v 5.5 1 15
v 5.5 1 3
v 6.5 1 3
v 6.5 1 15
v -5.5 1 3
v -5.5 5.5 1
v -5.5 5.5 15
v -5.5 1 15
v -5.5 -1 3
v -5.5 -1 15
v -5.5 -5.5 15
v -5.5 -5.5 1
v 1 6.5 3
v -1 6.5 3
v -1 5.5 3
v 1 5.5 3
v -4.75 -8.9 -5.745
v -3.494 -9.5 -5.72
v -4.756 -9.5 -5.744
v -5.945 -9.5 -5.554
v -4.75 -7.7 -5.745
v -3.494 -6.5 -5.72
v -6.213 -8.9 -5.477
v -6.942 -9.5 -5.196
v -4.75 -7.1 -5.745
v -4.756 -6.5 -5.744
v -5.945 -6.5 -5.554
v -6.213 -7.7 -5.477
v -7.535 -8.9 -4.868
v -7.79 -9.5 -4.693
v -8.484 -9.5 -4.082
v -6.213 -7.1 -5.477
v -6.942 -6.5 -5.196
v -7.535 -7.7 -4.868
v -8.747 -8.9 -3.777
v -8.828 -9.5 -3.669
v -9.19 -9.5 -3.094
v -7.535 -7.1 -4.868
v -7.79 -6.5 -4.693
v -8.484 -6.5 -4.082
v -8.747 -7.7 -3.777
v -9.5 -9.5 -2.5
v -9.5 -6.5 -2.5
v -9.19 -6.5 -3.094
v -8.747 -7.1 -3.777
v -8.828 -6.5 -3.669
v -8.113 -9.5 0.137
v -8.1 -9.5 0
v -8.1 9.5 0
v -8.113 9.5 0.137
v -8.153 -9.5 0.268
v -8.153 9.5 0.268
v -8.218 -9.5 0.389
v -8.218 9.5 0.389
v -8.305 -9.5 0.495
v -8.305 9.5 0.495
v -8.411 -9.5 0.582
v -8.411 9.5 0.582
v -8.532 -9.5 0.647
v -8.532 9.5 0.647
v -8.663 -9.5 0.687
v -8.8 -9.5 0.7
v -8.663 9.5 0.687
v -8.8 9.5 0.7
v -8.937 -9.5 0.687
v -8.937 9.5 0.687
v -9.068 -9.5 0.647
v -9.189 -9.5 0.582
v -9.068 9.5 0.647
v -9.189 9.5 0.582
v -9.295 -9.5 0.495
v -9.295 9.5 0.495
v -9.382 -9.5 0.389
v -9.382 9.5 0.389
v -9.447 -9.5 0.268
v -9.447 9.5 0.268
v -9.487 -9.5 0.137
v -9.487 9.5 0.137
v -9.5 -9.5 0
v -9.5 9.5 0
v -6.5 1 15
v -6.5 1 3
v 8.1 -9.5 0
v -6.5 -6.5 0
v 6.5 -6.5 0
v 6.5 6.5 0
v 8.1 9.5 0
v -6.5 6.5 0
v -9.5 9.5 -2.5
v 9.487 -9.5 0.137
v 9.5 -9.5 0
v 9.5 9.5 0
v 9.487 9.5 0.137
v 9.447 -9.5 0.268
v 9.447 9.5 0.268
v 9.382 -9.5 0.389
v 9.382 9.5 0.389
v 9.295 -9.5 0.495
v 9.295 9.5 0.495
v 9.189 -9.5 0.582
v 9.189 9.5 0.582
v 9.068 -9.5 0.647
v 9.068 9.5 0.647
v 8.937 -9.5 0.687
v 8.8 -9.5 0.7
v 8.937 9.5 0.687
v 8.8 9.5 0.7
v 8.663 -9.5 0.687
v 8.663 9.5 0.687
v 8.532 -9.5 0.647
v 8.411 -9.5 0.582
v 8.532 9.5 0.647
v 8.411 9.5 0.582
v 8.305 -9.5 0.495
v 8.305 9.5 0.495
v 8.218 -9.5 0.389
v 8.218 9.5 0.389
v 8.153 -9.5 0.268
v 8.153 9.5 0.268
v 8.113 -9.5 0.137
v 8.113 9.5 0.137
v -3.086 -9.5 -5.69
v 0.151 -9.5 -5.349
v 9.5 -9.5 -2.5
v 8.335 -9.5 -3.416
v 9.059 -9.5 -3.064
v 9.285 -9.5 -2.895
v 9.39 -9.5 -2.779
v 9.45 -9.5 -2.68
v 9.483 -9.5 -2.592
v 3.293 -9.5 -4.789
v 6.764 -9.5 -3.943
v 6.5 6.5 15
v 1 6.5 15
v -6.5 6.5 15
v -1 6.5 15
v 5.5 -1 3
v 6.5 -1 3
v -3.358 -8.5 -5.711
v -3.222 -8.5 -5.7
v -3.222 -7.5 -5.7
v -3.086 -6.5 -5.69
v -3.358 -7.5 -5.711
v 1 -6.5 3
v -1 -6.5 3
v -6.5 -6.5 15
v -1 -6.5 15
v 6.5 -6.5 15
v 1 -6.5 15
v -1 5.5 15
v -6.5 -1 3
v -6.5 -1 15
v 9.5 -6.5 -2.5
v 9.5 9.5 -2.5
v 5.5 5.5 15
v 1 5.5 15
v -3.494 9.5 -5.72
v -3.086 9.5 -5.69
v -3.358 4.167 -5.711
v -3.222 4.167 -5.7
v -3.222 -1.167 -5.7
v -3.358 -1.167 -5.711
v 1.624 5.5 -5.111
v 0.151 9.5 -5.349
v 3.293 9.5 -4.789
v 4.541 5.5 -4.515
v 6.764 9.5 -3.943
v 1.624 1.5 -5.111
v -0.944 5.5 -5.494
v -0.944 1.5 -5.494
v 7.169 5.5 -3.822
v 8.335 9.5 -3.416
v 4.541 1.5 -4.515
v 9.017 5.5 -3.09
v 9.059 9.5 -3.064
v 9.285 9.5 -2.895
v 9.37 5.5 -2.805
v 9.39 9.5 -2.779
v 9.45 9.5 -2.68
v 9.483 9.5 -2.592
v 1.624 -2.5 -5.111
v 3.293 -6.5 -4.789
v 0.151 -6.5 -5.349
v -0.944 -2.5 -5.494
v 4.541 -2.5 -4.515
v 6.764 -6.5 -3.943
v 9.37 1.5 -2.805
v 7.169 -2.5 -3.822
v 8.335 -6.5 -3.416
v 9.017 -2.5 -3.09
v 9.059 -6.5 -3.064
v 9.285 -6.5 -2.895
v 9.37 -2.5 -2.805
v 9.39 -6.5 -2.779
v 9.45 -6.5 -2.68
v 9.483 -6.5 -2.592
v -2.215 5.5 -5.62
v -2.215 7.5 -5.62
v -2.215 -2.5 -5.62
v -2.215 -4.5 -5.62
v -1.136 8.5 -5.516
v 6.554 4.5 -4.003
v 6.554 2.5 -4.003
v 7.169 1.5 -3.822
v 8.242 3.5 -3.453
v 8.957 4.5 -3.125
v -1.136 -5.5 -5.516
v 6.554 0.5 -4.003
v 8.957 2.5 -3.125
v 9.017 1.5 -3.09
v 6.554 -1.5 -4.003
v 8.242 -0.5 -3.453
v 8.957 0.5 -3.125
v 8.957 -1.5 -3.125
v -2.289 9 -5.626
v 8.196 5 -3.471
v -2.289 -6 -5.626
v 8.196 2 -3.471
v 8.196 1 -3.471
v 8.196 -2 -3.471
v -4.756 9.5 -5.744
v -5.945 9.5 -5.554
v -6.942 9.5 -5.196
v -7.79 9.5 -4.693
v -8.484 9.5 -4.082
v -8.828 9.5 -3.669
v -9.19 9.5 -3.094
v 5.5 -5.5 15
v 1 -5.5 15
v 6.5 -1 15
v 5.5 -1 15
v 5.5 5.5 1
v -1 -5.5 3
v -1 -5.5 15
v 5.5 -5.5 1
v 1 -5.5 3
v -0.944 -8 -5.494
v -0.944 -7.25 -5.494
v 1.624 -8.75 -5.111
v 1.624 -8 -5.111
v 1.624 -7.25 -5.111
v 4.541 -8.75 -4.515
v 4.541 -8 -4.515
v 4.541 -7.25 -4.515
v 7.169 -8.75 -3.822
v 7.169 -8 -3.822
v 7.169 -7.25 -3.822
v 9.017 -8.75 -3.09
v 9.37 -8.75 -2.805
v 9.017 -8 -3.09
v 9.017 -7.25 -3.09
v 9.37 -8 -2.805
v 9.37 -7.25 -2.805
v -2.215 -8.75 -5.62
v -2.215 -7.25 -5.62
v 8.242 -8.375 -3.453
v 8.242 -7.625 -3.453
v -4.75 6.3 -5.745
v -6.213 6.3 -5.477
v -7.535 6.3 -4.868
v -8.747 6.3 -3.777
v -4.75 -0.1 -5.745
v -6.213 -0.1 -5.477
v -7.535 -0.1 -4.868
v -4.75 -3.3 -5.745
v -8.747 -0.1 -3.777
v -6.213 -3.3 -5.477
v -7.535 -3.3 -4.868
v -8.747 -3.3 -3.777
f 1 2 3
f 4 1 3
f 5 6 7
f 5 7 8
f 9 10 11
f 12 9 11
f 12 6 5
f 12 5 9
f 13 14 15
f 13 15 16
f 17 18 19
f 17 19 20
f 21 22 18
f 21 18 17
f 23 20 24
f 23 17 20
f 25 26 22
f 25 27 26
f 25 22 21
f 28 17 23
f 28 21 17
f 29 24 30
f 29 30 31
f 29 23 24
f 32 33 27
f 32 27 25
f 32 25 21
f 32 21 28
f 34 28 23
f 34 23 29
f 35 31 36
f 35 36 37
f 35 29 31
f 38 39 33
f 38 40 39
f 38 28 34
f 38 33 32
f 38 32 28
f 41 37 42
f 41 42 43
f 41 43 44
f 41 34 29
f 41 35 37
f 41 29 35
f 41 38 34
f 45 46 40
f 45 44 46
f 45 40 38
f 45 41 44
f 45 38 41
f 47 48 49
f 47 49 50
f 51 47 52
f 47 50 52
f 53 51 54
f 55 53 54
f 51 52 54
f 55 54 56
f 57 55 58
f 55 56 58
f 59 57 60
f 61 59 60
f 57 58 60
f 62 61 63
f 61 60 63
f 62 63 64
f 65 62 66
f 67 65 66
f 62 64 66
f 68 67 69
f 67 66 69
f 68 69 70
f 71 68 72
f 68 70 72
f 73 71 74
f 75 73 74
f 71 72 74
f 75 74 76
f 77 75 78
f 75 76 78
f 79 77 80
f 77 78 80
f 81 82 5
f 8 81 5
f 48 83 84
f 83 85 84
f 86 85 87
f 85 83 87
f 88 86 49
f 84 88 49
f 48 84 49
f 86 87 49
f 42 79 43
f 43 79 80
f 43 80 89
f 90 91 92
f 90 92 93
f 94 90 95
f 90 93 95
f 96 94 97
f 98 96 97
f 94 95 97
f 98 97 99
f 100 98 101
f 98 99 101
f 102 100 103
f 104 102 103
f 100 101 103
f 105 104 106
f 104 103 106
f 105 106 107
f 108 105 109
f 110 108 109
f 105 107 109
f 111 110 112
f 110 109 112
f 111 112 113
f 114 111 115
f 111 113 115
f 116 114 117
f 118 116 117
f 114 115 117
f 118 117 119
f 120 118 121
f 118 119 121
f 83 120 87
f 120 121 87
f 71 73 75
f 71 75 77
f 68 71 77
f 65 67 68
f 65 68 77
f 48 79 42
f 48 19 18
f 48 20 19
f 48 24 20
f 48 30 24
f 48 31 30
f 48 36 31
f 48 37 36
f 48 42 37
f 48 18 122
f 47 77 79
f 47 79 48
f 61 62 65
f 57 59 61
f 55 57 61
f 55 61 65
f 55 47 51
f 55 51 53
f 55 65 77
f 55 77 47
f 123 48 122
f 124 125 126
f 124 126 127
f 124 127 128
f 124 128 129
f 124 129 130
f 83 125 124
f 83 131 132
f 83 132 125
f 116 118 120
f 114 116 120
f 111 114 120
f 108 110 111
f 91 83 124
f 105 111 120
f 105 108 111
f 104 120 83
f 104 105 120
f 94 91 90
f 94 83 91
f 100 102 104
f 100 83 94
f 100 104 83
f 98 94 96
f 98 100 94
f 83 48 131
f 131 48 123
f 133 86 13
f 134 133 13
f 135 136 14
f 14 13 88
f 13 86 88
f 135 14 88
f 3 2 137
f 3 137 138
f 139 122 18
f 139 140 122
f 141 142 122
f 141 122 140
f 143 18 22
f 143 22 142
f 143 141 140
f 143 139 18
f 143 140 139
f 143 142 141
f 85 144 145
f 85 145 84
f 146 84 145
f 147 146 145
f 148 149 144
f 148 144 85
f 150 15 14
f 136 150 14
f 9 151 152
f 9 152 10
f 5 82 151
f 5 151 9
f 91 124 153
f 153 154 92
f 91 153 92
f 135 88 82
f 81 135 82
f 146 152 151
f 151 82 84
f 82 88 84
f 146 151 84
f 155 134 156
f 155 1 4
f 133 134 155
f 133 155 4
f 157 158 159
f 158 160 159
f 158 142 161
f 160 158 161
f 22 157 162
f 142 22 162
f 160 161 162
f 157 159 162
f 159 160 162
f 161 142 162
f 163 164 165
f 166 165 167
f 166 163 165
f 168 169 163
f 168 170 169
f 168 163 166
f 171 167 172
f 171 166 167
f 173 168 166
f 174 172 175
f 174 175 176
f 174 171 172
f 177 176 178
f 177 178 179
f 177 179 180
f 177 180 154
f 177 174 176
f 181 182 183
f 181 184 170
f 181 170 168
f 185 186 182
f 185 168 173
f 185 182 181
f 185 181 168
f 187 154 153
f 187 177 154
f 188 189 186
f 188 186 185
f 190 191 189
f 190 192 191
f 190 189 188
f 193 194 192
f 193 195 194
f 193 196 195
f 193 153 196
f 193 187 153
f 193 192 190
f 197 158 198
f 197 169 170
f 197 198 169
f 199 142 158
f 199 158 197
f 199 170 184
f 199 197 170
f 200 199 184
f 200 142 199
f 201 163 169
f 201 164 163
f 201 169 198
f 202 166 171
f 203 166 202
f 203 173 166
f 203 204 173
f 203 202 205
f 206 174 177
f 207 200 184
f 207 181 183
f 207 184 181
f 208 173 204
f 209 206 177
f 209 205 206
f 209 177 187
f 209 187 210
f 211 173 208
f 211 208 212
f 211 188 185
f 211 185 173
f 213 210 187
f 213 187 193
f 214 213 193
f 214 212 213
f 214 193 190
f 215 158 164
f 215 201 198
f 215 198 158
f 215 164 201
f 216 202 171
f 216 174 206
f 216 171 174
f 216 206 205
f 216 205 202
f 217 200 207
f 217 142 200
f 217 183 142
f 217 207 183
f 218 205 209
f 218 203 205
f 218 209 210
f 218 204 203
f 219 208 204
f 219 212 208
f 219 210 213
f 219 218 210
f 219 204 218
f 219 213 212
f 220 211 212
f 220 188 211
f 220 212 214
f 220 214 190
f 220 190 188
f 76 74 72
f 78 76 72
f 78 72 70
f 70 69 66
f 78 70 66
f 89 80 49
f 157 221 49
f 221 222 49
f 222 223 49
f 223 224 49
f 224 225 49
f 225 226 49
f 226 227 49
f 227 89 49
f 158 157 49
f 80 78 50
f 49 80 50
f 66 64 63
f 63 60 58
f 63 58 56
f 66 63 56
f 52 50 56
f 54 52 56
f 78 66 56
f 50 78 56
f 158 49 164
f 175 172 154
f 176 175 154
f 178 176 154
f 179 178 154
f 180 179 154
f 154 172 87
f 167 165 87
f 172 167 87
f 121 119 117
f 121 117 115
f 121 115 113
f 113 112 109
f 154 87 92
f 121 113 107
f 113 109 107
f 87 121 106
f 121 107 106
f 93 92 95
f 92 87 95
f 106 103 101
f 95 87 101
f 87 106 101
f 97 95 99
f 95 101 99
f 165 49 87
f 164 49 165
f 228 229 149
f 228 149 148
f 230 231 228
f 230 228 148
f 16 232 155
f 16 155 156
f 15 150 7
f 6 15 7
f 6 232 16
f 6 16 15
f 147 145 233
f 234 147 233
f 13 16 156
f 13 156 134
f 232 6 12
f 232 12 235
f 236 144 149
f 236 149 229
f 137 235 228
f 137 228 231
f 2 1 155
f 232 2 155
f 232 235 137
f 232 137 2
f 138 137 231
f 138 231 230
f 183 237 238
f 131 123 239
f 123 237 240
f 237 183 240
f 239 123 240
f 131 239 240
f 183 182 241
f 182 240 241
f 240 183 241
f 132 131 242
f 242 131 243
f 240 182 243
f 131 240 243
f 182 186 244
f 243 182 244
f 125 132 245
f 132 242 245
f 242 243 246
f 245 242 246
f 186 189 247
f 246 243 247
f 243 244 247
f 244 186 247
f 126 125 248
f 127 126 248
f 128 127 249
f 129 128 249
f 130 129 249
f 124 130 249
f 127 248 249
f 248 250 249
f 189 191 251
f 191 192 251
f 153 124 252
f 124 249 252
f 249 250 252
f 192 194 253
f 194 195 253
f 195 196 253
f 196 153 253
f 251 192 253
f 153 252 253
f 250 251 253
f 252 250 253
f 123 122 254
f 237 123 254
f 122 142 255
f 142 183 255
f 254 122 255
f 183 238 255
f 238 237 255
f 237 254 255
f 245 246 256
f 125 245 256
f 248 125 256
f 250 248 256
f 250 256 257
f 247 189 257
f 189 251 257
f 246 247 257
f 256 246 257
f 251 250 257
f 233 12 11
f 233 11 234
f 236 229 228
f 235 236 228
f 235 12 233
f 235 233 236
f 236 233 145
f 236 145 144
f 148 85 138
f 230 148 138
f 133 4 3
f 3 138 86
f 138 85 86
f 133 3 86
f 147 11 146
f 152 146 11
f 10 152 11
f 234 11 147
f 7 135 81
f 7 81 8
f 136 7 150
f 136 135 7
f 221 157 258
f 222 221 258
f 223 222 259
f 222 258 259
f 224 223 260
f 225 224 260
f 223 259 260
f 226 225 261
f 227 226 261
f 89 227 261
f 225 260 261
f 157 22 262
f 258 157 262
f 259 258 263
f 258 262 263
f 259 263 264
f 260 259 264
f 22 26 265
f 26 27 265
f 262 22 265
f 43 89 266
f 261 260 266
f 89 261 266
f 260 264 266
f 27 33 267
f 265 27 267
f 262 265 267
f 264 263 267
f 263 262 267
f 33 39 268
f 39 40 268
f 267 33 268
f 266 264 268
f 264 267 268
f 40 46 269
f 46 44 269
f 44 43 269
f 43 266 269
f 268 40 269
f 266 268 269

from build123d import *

# Parameters (mm, degrees)
F0_W          = 5.5
F0_H          = 5.5
F0_W_2        = 2
F0_H_2        = 2
F1_DEPTH      = 15
F2_T          = -1
F3_START      = 3
F3_DEPTH      = 22
F5_DEPTH      = 16
F5_DEPTH_BACK = 3


with BuildPart() as f1:
    # F0 (on Top) → F1 (new body)
    with BuildSketch(Plane.XY):
        with Locations((3.75, 3.75)):
            Rectangle(F0_W, F0_H)
        with Locations((0, 3.75)):
            Rectangle(F0_W_2, F0_H)
        with Locations((-3.75, 3.75)):
            Rectangle(F0_W, F0_H)
        with Locations((-3.75, 0)):
            Rectangle(F0_W, F0_H_2)
        Rectangle(F0_W_2, F0_H_2)
        with Locations((3.75, 0)):
            Rectangle(F0_W, F0_H_2)
        with Locations((3.75, -3.75)):
            Rectangle(F0_W, F0_H)
        with Locations((0, -3.75)):
            Rectangle(F0_W_2, F0_H)
        with Locations((-3.75, -3.75)):
            Rectangle(F0_W, F0_H)
    extrude(amount=F1_DEPTH)

    # F2
    f2_openings = [f1.faces().sort_by_distance(p)[0] for p in [
        (0, 0, 15),
    ]]
    offset(amount=F2_T, openings=f2_openings)

    # F0 (on Top) → F3 (cut)
    with BuildSketch(Plane.XY.offset(F3_START)):
        with Locations((-3.75, 0)):
            Rectangle(F0_W, F0_H_2)
        with Locations((0, 3.75)):
            Rectangle(F0_W_2, F0_H)
        with Locations((3.75, 0)):
            Rectangle(F0_W, F0_H_2)
        with Locations((0, -3.75)):
            Rectangle(F0_W_2, F0_H)
    extrude(amount=F3_DEPTH, mode=Mode.SUBTRACT)

    # F4 (on face) → F5 (join, two sides)
    with BuildSketch(Plane.XZ.offset(6.5)) as f5_sk:
        Polygon((9.5, -2.5), (9.5, 0), (8.1, 0), (6.5, 0), (-6.5, 0), (-8.1, 0), (-9.5, 0), (-9.5, -2.5), align=None)
        with BuildLine():
            ThreePointArc((-8.1, 0), (-8.8, 0.7), (-9.5, 0))
            Line((-9.5, 0), (-8.1, 0))
        make_face()
        with BuildLine():
            Line((8.1, 0), (9.5, 0))
            ThreePointArc((9.5, 0), (8.8, 0.7), (8.1, 0))
        make_face()
        with BuildLine():
            add(Edge.make_bspline(
                [(-3.0857180245, -5.6900443979), (-2.6711979969, -5.6534883338), (-0.6382155364, -5.5259124188), (4.3516854172, -4.6654656415), (8.9744619057, -3.3519325688), (9.4804499148, -2.7164395318), (9.5, -2.5)],
                knots=[0.1581423577, 0.1581423577, 0.1581423577, 0.1581423577, 0.3379261215, 0.6272825134, 0.892948007, 1, 1, 1, 1], degree=3))
            Line((9.5, -2.5), (-9.5, -2.5))
            add(Edge.make_bspline(
                [(-3.4938230352, -5.7202531186), (-3.9193313832, -5.7494783037), (-4.8676868004, -5.791289792), (-6.2303397751, -5.5285607506), (-7.574736345, -4.9382947102), (-8.8313136046, -3.8354261533), (-9.278605125, -2.936326813), (-9.5, -2.5)],
                knots=[0.0502659739, 0.0502659739, 0.0502659739, 0.0502659739, 0.2077625312, 0.40408462, 0.5983848295, 0.8039601762, 1, 1, 1, 1], degree=3))
            add(Edge.make_bspline(
                [(-3.0857180245, -5.6900443979), (-3.2218733267, -5.7005172354), (-3.3580194857, -5.710925725), (-3.4938230352, -5.7202531186)],
                knots=[0, 0, 0, 0, 0.0502659739, 0.0502659739, 0.0502659739, 0.0502659739], degree=3))
        make_face()
    extrude(amount=-F5_DEPTH)
    extrude(f5_sk.sketch, amount=F5_DEPTH_BACK)


solid = f1.part
